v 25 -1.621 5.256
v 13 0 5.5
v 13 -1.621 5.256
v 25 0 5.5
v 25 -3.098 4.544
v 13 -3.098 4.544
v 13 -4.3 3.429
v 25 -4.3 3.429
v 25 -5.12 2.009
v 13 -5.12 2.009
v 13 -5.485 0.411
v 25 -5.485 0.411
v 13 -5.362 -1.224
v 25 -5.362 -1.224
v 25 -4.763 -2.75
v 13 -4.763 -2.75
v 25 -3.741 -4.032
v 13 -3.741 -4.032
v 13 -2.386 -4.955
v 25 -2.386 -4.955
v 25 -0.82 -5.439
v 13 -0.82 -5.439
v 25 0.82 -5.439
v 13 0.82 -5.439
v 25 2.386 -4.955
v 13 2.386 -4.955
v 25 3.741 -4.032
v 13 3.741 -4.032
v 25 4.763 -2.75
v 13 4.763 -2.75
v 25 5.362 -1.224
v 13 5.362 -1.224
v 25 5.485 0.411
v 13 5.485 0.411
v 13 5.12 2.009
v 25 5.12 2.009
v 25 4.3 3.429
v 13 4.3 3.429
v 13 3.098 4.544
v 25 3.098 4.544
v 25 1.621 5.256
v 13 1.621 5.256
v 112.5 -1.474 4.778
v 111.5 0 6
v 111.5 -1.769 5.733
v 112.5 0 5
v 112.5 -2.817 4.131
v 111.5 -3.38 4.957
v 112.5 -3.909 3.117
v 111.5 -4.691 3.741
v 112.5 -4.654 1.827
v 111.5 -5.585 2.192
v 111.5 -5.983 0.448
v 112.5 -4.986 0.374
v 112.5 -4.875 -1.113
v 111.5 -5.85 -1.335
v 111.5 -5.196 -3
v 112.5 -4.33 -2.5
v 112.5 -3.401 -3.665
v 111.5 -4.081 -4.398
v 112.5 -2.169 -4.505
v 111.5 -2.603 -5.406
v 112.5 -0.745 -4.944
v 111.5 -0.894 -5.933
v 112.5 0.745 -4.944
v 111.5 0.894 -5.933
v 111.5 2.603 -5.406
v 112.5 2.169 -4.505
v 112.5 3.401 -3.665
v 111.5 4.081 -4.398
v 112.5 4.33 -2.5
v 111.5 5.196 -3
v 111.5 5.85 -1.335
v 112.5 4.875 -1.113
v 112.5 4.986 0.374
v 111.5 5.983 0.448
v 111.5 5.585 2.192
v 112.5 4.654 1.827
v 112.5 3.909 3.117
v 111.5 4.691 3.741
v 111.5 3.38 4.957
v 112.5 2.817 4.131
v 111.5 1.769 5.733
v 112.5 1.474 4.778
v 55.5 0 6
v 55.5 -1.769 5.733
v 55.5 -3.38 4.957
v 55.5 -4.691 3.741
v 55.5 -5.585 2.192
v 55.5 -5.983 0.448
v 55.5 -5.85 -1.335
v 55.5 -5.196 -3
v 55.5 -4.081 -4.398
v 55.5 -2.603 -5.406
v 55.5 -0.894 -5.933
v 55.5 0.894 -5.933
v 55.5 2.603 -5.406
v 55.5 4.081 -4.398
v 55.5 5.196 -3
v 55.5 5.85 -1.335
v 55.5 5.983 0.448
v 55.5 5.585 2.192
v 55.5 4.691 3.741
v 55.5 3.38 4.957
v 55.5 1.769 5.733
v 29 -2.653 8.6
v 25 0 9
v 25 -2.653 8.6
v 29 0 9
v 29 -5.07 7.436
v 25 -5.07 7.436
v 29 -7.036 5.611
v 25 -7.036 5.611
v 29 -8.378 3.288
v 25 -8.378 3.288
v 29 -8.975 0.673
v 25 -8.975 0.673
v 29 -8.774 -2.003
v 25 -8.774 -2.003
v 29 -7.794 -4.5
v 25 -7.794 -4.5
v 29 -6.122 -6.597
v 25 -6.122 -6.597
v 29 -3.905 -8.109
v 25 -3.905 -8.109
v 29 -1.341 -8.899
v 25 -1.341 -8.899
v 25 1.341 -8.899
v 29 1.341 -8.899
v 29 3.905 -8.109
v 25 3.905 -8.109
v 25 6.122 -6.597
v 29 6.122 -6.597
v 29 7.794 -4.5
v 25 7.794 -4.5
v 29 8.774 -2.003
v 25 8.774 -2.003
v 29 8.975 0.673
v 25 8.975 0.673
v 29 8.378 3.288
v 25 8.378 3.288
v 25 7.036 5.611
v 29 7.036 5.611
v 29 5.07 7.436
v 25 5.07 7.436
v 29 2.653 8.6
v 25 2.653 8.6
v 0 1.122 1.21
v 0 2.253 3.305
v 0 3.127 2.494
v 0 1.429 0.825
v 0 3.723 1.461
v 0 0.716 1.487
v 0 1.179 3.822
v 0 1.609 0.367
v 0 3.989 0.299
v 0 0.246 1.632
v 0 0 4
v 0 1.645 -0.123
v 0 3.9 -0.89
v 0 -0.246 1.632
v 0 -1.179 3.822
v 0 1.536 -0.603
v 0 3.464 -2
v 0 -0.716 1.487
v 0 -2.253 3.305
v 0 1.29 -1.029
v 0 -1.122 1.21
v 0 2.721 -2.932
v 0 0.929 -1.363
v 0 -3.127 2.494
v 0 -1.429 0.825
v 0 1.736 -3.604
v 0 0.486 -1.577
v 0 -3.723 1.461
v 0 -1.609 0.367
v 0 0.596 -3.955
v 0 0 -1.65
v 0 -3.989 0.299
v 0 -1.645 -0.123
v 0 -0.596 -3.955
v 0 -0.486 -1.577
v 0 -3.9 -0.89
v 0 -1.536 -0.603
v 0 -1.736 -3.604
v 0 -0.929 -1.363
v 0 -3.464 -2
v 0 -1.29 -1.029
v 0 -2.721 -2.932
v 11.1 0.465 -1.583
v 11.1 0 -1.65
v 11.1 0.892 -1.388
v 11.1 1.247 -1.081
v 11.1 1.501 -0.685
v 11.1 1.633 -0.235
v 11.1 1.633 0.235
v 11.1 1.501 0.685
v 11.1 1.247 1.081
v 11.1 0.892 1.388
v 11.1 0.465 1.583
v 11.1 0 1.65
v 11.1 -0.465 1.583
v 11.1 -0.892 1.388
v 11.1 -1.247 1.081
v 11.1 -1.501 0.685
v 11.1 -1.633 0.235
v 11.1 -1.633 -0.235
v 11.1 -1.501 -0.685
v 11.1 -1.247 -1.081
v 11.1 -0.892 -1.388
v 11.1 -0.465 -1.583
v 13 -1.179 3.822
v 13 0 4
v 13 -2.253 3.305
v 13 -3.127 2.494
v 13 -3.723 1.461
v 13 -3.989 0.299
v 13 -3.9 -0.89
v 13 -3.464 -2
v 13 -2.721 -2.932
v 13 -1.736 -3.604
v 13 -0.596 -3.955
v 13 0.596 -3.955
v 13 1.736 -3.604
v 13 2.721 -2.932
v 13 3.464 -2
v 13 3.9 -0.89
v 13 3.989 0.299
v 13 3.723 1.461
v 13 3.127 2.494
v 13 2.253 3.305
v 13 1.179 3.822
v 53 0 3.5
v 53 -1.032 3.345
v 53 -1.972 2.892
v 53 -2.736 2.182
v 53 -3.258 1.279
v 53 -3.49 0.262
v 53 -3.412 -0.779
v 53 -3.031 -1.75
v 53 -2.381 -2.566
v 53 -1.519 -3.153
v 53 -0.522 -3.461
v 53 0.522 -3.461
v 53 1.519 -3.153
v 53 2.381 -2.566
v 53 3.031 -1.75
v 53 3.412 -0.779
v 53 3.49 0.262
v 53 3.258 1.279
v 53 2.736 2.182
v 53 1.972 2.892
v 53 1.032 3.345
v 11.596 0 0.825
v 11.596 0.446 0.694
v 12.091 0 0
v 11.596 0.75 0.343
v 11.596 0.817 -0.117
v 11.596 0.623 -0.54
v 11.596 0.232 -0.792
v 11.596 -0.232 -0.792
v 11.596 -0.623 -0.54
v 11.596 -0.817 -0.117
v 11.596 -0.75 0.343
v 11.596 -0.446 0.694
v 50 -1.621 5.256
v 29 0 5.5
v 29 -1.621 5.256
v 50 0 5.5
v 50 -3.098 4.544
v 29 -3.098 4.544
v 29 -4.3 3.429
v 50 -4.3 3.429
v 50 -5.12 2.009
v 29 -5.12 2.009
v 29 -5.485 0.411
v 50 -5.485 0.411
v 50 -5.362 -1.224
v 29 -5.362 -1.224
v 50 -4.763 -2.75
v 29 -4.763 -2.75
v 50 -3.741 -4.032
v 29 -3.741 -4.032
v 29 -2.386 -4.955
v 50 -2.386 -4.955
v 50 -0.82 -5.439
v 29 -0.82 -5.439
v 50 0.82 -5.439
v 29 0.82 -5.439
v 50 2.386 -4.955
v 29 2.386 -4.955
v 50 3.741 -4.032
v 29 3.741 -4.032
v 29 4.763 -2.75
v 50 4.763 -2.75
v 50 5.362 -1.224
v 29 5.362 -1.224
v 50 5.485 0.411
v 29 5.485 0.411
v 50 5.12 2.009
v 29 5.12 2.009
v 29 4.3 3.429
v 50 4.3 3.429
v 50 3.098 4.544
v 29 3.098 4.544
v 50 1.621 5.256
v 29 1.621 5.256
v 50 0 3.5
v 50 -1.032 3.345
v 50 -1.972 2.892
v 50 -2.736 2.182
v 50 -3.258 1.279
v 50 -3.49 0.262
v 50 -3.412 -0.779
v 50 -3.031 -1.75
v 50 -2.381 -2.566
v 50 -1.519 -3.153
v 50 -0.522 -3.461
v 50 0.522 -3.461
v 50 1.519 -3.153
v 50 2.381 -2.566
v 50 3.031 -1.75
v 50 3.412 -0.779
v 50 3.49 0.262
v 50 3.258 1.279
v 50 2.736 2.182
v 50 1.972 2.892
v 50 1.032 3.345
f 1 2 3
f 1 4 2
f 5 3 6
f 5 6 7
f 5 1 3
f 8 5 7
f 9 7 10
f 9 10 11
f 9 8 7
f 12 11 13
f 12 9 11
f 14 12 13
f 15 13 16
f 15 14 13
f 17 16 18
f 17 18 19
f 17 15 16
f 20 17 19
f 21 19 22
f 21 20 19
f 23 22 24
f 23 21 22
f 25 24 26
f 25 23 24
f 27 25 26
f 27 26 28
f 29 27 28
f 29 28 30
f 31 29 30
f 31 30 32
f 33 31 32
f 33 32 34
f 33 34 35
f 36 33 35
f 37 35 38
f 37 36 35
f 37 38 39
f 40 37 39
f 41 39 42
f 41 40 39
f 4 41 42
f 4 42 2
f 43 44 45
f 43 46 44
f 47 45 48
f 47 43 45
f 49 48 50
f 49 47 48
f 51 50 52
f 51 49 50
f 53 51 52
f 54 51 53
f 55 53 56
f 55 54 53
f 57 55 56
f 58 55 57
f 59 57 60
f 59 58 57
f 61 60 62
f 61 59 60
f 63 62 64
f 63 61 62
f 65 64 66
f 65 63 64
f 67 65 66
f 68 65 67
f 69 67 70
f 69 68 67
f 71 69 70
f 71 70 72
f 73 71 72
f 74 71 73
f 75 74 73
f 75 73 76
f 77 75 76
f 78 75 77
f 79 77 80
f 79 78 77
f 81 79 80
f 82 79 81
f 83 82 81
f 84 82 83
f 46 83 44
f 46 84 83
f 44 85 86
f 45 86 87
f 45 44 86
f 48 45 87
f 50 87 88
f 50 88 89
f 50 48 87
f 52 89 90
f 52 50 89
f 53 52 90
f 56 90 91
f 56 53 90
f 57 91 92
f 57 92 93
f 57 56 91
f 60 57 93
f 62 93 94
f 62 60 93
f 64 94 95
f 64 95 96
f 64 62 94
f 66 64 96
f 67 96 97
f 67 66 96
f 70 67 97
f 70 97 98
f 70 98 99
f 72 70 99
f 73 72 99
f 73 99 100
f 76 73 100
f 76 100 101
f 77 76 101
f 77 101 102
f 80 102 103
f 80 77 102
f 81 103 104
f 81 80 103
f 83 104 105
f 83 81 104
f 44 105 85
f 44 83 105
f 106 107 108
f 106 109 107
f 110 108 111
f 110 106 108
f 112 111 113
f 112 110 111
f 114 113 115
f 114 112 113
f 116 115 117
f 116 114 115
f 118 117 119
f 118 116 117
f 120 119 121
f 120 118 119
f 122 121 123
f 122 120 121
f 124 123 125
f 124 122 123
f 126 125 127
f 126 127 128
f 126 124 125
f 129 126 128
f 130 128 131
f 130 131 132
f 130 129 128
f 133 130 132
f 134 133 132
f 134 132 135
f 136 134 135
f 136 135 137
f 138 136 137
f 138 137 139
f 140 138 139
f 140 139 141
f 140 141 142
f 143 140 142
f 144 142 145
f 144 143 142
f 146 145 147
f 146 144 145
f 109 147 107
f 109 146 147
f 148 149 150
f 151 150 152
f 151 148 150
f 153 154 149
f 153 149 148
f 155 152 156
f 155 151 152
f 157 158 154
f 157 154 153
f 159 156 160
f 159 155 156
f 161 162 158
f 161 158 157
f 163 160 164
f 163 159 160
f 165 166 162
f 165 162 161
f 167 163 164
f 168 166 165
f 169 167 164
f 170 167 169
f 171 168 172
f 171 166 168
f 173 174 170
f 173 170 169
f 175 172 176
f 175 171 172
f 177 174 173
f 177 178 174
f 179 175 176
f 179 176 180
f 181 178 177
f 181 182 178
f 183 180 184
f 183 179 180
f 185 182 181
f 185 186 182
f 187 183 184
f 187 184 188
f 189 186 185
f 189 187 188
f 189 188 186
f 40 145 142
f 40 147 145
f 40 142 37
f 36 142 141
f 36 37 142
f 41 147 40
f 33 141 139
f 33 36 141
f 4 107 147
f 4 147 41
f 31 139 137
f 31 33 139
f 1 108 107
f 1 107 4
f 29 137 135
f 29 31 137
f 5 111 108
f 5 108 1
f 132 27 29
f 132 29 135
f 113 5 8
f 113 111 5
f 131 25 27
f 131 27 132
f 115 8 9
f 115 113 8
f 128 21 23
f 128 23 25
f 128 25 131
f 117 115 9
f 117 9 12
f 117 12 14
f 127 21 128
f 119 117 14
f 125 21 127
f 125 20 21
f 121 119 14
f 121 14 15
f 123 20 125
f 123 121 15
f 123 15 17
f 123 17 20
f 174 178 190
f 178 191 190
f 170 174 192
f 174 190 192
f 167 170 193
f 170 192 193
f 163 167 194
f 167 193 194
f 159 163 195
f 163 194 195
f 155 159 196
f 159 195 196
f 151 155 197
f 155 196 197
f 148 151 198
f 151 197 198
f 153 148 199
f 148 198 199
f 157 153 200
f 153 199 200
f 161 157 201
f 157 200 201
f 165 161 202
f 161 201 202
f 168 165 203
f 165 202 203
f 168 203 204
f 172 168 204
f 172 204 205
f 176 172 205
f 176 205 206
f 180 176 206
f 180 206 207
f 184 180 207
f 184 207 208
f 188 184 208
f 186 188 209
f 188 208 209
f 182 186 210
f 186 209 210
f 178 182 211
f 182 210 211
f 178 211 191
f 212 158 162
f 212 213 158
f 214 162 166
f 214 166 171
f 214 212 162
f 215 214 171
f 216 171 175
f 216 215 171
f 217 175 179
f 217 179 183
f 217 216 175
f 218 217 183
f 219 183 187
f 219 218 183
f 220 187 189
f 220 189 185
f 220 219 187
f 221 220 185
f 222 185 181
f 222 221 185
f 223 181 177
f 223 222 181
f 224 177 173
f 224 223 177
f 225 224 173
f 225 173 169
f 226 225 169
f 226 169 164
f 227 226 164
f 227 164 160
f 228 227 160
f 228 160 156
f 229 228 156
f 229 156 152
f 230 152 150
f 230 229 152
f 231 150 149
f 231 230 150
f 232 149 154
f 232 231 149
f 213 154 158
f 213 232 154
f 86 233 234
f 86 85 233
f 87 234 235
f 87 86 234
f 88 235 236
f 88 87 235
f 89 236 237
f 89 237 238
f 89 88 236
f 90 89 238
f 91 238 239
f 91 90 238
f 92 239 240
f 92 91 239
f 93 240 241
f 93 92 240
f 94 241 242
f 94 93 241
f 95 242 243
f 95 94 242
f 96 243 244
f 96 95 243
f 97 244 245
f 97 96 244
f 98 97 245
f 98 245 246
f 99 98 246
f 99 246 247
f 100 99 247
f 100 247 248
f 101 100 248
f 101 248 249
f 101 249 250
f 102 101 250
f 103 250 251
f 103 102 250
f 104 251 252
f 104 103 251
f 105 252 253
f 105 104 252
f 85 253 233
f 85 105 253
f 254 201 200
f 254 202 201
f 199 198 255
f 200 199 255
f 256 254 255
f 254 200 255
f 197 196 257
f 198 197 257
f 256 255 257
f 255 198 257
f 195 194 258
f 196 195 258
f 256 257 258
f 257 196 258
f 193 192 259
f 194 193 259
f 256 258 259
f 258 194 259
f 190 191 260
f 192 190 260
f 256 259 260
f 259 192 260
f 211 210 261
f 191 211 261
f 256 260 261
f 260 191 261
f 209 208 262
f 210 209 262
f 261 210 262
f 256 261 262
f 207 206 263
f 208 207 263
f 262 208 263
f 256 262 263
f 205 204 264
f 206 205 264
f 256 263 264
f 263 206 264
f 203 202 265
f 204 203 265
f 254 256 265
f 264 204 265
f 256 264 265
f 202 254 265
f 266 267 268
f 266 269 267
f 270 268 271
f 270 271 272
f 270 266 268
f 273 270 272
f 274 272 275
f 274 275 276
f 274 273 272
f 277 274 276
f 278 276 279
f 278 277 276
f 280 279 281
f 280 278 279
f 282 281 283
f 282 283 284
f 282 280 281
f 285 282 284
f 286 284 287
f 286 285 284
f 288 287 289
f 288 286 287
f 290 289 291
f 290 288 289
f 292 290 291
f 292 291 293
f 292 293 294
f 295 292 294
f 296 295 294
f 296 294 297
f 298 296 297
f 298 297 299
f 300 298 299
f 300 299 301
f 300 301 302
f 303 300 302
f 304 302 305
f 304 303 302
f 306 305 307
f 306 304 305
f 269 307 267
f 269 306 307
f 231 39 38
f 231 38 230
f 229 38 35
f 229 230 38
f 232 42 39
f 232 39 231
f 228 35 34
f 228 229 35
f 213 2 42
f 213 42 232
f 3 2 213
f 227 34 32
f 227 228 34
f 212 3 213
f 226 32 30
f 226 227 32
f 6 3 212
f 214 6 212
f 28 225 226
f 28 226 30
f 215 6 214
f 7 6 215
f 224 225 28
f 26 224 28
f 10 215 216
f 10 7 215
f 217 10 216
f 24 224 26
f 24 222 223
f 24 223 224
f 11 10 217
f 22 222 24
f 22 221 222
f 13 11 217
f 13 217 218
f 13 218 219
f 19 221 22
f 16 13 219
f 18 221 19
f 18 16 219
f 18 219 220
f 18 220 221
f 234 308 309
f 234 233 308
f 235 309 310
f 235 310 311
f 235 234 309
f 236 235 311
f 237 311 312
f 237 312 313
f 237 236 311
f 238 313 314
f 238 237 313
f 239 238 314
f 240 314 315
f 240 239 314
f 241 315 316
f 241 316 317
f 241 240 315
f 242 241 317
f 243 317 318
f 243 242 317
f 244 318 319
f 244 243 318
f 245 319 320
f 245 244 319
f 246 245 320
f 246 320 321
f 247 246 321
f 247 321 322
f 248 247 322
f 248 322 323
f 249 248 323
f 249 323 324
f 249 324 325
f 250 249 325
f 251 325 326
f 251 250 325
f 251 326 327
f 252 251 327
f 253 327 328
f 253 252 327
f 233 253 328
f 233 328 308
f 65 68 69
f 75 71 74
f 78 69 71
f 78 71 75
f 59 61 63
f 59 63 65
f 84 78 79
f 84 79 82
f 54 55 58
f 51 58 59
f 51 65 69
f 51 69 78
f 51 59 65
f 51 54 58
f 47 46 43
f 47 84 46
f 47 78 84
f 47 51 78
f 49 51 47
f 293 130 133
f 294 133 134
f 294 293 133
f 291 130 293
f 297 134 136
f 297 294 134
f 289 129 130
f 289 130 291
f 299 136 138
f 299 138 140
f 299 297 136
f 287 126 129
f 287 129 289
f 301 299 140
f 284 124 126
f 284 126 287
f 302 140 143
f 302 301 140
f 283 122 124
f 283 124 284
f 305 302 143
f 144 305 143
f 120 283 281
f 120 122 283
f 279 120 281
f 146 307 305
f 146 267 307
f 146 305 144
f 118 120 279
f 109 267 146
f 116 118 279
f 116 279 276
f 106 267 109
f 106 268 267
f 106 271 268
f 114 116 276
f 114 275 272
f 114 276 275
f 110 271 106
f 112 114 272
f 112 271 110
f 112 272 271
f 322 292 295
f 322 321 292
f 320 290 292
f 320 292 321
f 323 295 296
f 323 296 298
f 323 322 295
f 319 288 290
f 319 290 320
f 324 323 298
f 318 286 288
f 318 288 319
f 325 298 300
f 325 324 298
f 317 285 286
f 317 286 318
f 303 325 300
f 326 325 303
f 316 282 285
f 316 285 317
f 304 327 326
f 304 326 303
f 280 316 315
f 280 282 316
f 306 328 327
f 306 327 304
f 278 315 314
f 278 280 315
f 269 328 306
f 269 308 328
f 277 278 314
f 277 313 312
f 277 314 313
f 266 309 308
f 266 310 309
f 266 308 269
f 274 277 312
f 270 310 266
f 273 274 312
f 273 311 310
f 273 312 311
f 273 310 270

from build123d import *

# Parameters (mm, degrees)
TROU_TARAUD_M42_D     = 3.3
TROU_TARAUD_M42_DEPTH = 11.1
TROU_TARAUD_M42_TIP   = 0.991420021


with BuildPart() as part:
    # Esquisse1 → Révolution1 (revolve)
    with BuildSketch(Plane.XY, mode=Mode.PRIVATE) as r_volution1_sk:
        Polygon((0, 0), (0, 4), (13, 4), (13, 5.5), (25, 5.5), (25, 9), (29, 9), (29, 5.5), (50, 5.5), (50, 3.5), (53, 3.5), (55.5, 6), (111.5, 6), (112.5, 5), (112.5, 0), align=None)
    revolve(r_volution1_sk.sketch.rotate(Axis((-83.694243421, 0, 0), (1, 0, 0)), 90), axis=Axis((-83.694243421, 0, 0), (1, 0, 0)))

    # Trou taraudé M42
    with Locations(Plane.ZY):
        with Locations((0, 0)):
            Hole(TROU_TARAUD_M42_D / 2, depth=TROU_TARAUD_M42_DEPTH)
            with Locations((0, 0, -(TROU_TARAUD_M42_DEPTH + TROU_TARAUD_M42_TIP / 2))):  # 118° drill point
                Cone(0, TROU_TARAUD_M42_D / 2, TROU_TARAUD_M42_TIP, mode=Mode.SUBTRACT)


solid = part.part
